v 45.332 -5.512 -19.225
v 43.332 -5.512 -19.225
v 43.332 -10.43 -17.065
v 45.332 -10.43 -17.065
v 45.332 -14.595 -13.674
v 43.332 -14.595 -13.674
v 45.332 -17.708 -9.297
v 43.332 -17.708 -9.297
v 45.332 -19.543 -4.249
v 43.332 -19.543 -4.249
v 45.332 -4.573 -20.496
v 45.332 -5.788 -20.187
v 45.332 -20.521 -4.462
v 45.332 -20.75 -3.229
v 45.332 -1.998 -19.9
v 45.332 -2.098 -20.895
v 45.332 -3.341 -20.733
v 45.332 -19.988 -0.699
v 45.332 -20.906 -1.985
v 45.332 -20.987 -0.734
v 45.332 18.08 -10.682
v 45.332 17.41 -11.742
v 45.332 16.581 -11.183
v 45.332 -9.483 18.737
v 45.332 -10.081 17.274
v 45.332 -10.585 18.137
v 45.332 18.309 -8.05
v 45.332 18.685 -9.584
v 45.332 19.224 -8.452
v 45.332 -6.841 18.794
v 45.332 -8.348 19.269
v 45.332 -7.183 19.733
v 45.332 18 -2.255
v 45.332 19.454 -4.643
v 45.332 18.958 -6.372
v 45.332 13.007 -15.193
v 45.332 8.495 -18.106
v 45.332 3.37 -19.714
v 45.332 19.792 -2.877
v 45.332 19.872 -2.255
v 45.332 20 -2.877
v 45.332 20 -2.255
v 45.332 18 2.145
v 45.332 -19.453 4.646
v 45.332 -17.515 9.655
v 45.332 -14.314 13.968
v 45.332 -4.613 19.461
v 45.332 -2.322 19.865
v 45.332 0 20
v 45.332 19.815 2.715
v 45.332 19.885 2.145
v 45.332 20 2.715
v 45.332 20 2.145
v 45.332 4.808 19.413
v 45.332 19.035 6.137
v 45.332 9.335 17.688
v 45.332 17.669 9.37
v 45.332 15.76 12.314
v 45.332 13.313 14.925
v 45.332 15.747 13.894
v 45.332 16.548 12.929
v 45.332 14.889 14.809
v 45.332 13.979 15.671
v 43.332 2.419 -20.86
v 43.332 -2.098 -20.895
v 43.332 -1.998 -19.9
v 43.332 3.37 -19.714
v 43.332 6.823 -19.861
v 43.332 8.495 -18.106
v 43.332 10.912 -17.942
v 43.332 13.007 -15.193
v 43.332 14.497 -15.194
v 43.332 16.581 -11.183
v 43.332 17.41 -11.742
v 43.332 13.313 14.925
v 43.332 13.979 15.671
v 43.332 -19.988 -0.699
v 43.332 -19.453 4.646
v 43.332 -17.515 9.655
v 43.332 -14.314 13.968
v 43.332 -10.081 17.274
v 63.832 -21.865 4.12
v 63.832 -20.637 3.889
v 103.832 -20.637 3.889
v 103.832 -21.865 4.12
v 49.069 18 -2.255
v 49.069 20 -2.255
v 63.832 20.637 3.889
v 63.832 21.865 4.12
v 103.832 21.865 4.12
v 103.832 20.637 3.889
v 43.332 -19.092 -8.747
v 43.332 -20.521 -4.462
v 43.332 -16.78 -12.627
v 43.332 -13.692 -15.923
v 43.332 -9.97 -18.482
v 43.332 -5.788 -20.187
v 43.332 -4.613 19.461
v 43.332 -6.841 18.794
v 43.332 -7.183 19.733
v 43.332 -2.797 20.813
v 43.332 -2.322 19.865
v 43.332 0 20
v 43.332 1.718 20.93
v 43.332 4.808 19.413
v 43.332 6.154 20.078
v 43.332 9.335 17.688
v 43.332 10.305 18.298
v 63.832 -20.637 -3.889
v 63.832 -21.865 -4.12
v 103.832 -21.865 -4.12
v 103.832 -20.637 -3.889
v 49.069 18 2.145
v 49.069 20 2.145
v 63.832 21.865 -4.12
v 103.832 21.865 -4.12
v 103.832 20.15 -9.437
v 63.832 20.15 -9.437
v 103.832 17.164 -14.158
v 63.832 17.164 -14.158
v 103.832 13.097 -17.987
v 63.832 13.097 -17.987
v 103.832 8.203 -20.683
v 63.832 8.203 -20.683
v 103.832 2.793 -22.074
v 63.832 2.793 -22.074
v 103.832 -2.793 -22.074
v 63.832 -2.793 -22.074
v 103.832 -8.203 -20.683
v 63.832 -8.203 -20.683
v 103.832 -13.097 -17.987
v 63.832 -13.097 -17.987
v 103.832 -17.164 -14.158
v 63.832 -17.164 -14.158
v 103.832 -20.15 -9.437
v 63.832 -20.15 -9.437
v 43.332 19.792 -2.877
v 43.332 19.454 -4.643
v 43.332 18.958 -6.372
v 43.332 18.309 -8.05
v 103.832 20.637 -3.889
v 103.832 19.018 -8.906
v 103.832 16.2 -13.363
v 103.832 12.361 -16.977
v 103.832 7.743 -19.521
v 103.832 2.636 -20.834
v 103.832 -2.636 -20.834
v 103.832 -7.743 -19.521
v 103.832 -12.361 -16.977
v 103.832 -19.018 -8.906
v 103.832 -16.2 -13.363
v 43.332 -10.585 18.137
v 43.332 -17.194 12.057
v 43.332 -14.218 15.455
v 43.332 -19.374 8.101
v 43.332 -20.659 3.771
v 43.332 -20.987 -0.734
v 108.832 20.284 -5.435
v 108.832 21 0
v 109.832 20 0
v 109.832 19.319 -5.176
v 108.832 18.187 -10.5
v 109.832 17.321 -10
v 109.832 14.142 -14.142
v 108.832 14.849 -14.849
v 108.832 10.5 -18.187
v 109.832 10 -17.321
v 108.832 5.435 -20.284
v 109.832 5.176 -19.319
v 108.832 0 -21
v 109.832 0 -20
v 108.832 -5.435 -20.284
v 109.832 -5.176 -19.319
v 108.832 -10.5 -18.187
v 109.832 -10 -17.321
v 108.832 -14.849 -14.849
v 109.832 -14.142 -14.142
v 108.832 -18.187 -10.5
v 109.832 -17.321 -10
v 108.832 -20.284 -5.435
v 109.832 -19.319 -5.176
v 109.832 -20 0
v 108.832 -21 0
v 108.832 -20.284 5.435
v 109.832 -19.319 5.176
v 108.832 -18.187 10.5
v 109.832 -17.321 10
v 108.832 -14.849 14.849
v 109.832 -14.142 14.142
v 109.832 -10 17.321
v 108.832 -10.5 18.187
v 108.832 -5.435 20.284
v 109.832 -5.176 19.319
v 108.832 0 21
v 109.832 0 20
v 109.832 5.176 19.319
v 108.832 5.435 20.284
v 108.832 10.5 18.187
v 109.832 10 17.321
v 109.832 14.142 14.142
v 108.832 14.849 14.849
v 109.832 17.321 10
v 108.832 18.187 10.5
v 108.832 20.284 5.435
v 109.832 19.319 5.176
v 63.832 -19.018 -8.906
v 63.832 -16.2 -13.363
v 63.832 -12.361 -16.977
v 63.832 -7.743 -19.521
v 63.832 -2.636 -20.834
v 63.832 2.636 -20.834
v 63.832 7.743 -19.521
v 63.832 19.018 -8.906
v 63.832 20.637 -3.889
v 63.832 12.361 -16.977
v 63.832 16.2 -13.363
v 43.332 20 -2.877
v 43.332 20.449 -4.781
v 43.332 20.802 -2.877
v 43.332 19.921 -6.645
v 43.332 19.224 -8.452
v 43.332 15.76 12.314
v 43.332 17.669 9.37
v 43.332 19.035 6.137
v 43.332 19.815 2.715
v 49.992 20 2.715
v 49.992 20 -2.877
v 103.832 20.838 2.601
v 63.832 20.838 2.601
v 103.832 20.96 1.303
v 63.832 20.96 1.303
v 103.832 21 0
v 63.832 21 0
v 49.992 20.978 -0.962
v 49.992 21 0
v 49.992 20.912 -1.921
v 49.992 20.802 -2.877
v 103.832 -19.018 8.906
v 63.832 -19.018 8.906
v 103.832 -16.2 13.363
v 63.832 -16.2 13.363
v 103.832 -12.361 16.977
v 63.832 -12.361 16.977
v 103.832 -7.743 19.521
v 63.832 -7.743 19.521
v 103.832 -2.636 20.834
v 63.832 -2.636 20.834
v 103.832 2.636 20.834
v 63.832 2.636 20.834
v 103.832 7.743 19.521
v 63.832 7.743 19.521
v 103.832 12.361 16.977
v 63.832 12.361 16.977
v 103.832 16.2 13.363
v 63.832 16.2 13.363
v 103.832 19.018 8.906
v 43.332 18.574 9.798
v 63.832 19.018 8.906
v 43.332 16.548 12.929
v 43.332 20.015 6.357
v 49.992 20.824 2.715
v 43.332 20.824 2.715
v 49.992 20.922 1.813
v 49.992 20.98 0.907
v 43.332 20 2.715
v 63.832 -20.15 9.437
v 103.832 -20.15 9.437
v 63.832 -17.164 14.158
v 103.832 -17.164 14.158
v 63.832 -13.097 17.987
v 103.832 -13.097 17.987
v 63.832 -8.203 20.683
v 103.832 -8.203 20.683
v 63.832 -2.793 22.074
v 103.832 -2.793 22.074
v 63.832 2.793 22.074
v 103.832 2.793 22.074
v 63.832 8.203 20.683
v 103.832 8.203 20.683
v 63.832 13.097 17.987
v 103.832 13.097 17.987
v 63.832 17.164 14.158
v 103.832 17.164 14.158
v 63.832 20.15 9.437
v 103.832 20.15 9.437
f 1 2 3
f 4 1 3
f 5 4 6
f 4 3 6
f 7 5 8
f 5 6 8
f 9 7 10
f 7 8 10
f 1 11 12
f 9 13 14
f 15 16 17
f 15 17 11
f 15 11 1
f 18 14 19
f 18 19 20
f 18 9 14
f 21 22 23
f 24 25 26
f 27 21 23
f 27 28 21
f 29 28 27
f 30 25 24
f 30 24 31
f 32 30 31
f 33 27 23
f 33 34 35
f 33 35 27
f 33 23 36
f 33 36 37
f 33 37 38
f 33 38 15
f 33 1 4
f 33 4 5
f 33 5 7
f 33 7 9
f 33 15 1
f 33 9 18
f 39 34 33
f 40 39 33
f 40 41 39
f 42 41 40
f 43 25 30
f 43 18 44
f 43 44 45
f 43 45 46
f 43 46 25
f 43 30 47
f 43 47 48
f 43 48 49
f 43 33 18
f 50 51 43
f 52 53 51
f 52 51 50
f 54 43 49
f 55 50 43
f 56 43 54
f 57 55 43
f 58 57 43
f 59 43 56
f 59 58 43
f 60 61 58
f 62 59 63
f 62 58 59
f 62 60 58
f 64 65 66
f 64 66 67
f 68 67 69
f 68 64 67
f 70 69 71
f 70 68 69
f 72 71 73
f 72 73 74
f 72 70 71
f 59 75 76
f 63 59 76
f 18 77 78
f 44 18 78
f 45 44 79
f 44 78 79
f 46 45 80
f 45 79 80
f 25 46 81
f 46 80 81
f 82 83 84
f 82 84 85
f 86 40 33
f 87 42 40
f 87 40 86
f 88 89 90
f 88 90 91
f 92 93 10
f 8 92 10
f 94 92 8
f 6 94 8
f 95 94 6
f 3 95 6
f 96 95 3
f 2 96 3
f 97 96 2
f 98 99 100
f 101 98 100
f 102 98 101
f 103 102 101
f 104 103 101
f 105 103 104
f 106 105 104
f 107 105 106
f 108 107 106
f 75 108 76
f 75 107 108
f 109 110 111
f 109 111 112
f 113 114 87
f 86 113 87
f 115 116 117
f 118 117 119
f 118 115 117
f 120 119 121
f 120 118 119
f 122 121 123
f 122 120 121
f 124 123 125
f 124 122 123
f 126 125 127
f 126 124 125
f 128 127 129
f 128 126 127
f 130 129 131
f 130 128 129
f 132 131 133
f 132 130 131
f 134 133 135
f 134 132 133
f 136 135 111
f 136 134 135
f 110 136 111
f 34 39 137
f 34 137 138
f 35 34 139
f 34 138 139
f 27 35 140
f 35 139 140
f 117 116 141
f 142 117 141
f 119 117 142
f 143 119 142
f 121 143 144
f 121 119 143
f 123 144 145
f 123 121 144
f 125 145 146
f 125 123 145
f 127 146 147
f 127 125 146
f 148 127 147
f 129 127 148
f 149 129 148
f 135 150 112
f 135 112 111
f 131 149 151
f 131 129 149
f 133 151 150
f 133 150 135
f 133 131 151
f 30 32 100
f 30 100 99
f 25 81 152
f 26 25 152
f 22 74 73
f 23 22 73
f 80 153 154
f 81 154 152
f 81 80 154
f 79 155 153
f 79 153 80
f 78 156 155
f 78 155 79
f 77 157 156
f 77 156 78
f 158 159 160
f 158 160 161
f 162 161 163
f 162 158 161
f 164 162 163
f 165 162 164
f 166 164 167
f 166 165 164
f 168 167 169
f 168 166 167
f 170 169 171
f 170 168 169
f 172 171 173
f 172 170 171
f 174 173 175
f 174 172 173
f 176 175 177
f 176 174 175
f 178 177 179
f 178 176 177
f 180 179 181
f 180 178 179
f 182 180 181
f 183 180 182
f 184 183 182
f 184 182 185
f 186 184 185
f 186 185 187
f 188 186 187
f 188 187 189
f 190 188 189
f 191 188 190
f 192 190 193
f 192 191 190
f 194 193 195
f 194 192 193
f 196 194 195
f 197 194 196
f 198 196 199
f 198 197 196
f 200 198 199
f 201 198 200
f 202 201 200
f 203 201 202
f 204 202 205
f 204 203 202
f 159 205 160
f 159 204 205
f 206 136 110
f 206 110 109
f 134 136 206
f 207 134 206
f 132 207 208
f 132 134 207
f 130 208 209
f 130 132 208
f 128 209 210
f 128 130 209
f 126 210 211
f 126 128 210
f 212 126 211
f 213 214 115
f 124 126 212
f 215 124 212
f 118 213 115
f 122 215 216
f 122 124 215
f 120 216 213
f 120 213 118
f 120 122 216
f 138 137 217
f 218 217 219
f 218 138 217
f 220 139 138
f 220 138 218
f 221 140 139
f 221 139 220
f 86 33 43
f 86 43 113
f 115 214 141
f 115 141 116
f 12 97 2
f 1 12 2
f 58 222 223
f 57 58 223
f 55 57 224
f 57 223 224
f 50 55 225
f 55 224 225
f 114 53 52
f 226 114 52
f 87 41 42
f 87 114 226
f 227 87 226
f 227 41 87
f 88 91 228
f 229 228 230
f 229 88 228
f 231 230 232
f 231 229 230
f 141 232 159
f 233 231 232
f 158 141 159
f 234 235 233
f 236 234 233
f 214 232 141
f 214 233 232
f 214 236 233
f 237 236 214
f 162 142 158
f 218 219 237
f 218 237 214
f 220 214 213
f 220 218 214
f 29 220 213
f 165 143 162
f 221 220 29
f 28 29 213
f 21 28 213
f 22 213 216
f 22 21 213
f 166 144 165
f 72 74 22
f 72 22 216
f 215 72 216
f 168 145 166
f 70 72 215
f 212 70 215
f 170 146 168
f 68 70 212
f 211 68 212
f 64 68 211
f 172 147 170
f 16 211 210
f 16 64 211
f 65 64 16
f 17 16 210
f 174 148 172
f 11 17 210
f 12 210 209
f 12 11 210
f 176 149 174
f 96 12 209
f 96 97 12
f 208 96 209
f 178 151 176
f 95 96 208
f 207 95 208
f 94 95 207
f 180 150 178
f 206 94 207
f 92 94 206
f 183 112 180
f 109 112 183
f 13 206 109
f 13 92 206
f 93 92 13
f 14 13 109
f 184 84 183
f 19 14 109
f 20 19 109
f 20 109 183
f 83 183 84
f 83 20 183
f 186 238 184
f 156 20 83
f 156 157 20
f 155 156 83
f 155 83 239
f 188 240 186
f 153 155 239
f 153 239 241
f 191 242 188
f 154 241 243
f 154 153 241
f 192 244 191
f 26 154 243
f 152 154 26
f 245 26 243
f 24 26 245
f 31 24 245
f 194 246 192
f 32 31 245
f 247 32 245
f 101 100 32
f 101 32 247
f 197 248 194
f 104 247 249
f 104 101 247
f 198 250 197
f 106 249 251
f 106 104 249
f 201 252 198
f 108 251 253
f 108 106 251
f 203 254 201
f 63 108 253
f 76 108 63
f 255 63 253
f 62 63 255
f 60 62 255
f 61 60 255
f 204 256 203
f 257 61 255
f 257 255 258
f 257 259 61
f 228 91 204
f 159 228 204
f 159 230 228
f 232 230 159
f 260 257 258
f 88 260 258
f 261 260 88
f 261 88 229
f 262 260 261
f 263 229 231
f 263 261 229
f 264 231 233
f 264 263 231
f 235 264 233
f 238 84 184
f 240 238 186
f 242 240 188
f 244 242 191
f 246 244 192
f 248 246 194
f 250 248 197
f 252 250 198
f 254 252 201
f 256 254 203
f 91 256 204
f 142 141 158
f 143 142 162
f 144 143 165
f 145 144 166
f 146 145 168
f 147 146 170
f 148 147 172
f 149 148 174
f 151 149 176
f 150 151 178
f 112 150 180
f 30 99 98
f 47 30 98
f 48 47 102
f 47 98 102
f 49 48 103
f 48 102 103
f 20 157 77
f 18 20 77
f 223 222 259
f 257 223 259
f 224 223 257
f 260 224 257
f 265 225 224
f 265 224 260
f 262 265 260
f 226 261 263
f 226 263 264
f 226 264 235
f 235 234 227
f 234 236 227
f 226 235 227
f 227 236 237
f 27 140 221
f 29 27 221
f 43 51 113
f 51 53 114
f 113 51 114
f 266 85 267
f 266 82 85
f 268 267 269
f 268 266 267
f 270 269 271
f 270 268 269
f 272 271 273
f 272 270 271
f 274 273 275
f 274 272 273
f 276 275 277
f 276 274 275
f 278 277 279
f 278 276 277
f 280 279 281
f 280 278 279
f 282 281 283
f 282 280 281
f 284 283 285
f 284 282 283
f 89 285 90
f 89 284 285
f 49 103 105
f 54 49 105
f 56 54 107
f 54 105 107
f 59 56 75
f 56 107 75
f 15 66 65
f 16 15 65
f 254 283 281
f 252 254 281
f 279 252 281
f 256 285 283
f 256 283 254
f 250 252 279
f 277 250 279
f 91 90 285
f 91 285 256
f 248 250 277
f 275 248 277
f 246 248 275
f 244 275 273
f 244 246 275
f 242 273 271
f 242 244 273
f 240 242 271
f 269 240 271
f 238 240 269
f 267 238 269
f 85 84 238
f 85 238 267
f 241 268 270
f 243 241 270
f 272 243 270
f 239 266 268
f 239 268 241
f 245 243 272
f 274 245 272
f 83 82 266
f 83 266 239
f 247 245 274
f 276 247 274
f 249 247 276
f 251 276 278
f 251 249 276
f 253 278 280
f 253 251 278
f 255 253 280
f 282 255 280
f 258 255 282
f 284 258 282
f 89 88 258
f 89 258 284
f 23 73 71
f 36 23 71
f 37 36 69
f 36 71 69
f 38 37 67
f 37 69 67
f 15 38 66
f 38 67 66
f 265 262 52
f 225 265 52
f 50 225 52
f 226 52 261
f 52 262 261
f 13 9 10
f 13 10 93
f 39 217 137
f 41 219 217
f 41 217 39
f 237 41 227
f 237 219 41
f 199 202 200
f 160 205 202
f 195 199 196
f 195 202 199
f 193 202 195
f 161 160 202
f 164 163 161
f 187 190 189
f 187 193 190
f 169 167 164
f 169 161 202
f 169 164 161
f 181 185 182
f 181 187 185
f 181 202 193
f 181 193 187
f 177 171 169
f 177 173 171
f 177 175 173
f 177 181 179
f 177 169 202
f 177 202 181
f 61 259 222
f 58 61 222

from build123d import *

# Parameters (mm, degrees)
CHAMFER2_SIZE      = 1
CUT_EXTRUDE1_START = -111
CUT_EXTRUDE1_DEPTH = 111
SKETCH3_W          = 6.659868337
SKETCH3_H          = 5.59204707
CUT_EXTRUDE2_DEPTH = 1
SKETCH4_W          = 5.737170607
SKETCH4_H          = 4.399946053
CUT_EXTRUDE3_DEPTH = 2
CUT_EXTRUDE4_DEPTH = 2
SKETCH6_W          = 0.57084709
SKETCH6_H          = 1.008895736
CUT_EXTRUDE5_DEPTH = 2


with BuildPart() as part:
    # Sketch1 → Revolve1 (revolve)
    with BuildSketch(Plane.XY, mode=Mode.PRIVATE) as revolve1_sk:
        Polygon((43.331874727, 0), (109.831874727, 0), (109.831874727, -21), (103.831874727, -21), (103.831874727, -22.25), (63.831874727, -22.25), (63.831874727, -21), (43.331874727, -21), align=None)
    revolve(revolve1_sk.sketch.rotate(Axis((169.06951142, 0, 0), (-1, 0, 0)), 180), axis=Axis((169.06951142, 0, 0), (-1, 0, 0)))

    # Chamfer2
    chamfer2_edges = [part.edges().sort_by_distance(p)[0] for p in [
        (109.831874727, -21, 0),
    ]]
    chamfer(chamfer2_edges, length=CHAMFER2_SIZE)

    # Sketch2 → Cut-Extrude1 (cut)
    with BuildSketch(Plane(origin=(103.831874727, 0, 0), x_dir=(0, 0, -1), z_dir=(1, 0, 0)).offset(CUT_EXTRUDE1_START)):
        with BuildLine():
            Line((-4.120122391, 21.865202754), (-3.888654841, 20.636820577))
            ThreePointArc((-3.888654841, 20.636820577), (0, 21), (3.888654841, 20.636820577))
            Line((3.888654841, 20.636820577), (4.120122391, 21.865202754))
            ThreePointArc((4.120122391, 21.865202754), (0, 22.25), (-4.120122391, 21.865202754))
        make_face()
        with BuildLine():
            ThreePointArc((3.888654841, -20.636820577), (0, -21), (-3.888654841, -20.636820577))
            Line((-3.888654841, -20.636820577), (-4.120122391, -21.865202754))
            ThreePointArc((-4.120122391, -21.865202754), (0, -22.25), (4.120122391, -21.865202754))
            Line((4.120122391, -21.865202754), (3.888654841, -20.636820577))
        make_face()
    extrude(amount=CUT_EXTRUDE1_DEPTH, mode=Mode.SUBTRACT)

    # Sketch3 → Cut-Extrude2 (cut)
    with BuildSketch(Plane(origin=(0, 21, 0), x_dir=(1, 0, 0), z_dir=(0, 1, 0))):
        with Locations((46.661808896, 0.080549256)):
            Rectangle(SKETCH3_W, SKETCH3_H)
    extrude(amount=-CUT_EXTRUDE2_DEPTH, mode=Mode.SUBTRACT)

    # Sketch4 → Cut-Extrude3 (cut)
    with BuildSketch(Plane(origin=(0, 20, 0), x_dir=(1, 0, 0), z_dir=(0, 1, 0))):
        with Locations((46.200460031, 0.055345837)):
            Rectangle(SKETCH4_W, SKETCH4_H)
    extrude(amount=-CUT_EXTRUDE3_DEPTH, mode=Mode.SUBTRACT)

    # Sketch5 → Cut-Extrude4 (cut)
    with BuildSketch(Plane.ZY.offset(-43.331874727)):
        with BuildLine():
            ThreePointArc((14.925071035, 13.313236068), (13.674240438, 14.595038488), (12.31375629, 15.759803489))
            ThreePointArc((12.31375629, 15.759803489), (7.517637174, 18.533351864), (2.144627189, 19.884681899))
            Line((2.144627189, 19.884681899), (2.144627189, 18))
            Line((2.144627189, 18), (-2.255318864, 18))
            Line((-2.255318864, 18), (-2.255318864, 19.872431578))
            ThreePointArc((-2.255318864, 19.872431578), (-5.211421697, 19.309093296), (-8.049539324, 18.308602259))
            ThreePointArc((-8.049539324, 18.308602259), (-9.655133779, 17.5150904), (-11.183303846, 16.581125266))
            ThreePointArc((-11.183303846, 16.581125266), (-18.10627914, 8.494860547), (-19.899959931, -1.997897586))
            ThreePointArc((-19.899959931, -1.997897586), (-19.641441279, -3.770117305), (-19.225418173, -5.512104503))
            ThreePointArc((-19.225418173, -5.512104503), (-13.674240438, -14.595038488), (-4.249312288, -19.543370873))
            ThreePointArc((-4.249312288, -19.543370873), (-2.483944519, -19.845151036), (-0.698658033, -19.987793199))
            ThreePointArc((-0.698658033, -19.987793199), (9.655133779, -17.5150904), (17.273740508, -10.080569868))
            ThreePointArc((17.273740508, -10.080569868), (18.10627914, -8.494860547), (18.793623762, -6.841031054))
            ThreePointArc((18.793623762, -6.841031054), (19.696097015, -3.473292728), (20, 0))
            ThreePointArc((20, 0), (18.688250596, 7.123853568), (14.925071035, 13.313236068))
        make_face()
        with BuildLine():
            Line((2.144627189, 18), (2.144627189, 19.884681899))
            ThreePointArc((2.144627189, 19.884681899), (-0.055683744, 19.999922483), (-2.255318864, 19.872431578))
            Line((-2.255318864, 19.872431578), (-2.255318864, 18))
            Line((-2.255318864, 18), (2.144627189, 18))
        make_face()
        with BuildLine():
            ThreePointArc((-11.183303846, 16.581125266), (-9.655133779, 17.5150904), (-8.049539324, 18.308602259))
            Line((-8.049539324, 18.308602259), (-8.45201629, 19.224032372))
            ThreePointArc((-8.45201629, 19.224032372), (-10.137890468, 18.39084492), (-11.742469038, 17.410181529))
            Line((-11.742469038, 17.410181529), (-11.183303846, 16.581125266))
        make_face()
        with BuildLine():
            Line((12.929444105, 16.547793664), (12.31375629, 15.759803489))
            ThreePointArc((12.31375629, 15.759803489), (13.674240438, 14.595038488), (14.925071035, 13.313236068))
            Line((14.925071035, 13.313236068), (15.671324586, 13.978897872))
            ThreePointArc((15.671324586, 13.978897872), (14.357952459, 15.324790412), (12.929444105, 16.547793664))
        make_face()
        with BuildLine():
            Line((19.733304951, -7.183082606), (18.793623762, -6.841031054))
            ThreePointArc((18.793623762, -6.841031054), (18.10627914, -8.494860547), (17.273740508, -10.080569868))
            Line((17.273740508, -10.080569868), (18.137427533, -10.584598362))
            ThreePointArc((18.137427533, -10.584598362), (19.011593097, -8.919603575), (19.733304951, -7.183082606))
        make_face()
        with BuildLine():
            Line((-0.733590935, -20.987182859), (-0.698658033, -19.987793199))
            ThreePointArc((-0.698658033, -19.987793199), (-2.483944519, -19.845151036), (-4.249312288, -19.543370873))
            Line((-4.249312288, -19.543370873), (-4.461777902, -20.520539417))
            ThreePointArc((-4.461777902, -20.520539417), (-2.608141745, -20.837408587), (-0.733590935, -20.987182859))
        make_face()
        with BuildLine():
            ThreePointArc((-19.225418173, -5.512104503), (-19.641441279, -3.770117305), (-19.899959931, -1.997897586))
            Line((-19.899959931, -1.997897586), (-20.894957927, -2.097792465))
            ThreePointArc((-20.894957927, -2.097792465), (-20.623513343, -3.95862317), (-20.186689082, -5.787709728))
            Line((-20.186689082, -5.787709728), (-19.225418173, -5.512104503))
        make_face()
    extrude(amount=-CUT_EXTRUDE4_DEPTH, mode=Mode.SUBTRACT)

    # Sketch6 → Cut-Extrude5 (cut)
    with BuildSketch(Plane.ZY.offset(-43.331874727)):
        with Locations((2.430050734, 20.319245355)):
            Rectangle(SKETCH6_W, SKETCH6_H)
        Polygon((-2.876572791, 20.802051076), (-2.876572791, 19.720628681), (-2.255318864, 19.720628681), (-2.255318864, 20.908214592), (-2.876572791, 20.908214592), align=None)
    extrude(amount=-CUT_EXTRUDE5_DEPTH, mode=Mode.SUBTRACT)


solid = part.part
